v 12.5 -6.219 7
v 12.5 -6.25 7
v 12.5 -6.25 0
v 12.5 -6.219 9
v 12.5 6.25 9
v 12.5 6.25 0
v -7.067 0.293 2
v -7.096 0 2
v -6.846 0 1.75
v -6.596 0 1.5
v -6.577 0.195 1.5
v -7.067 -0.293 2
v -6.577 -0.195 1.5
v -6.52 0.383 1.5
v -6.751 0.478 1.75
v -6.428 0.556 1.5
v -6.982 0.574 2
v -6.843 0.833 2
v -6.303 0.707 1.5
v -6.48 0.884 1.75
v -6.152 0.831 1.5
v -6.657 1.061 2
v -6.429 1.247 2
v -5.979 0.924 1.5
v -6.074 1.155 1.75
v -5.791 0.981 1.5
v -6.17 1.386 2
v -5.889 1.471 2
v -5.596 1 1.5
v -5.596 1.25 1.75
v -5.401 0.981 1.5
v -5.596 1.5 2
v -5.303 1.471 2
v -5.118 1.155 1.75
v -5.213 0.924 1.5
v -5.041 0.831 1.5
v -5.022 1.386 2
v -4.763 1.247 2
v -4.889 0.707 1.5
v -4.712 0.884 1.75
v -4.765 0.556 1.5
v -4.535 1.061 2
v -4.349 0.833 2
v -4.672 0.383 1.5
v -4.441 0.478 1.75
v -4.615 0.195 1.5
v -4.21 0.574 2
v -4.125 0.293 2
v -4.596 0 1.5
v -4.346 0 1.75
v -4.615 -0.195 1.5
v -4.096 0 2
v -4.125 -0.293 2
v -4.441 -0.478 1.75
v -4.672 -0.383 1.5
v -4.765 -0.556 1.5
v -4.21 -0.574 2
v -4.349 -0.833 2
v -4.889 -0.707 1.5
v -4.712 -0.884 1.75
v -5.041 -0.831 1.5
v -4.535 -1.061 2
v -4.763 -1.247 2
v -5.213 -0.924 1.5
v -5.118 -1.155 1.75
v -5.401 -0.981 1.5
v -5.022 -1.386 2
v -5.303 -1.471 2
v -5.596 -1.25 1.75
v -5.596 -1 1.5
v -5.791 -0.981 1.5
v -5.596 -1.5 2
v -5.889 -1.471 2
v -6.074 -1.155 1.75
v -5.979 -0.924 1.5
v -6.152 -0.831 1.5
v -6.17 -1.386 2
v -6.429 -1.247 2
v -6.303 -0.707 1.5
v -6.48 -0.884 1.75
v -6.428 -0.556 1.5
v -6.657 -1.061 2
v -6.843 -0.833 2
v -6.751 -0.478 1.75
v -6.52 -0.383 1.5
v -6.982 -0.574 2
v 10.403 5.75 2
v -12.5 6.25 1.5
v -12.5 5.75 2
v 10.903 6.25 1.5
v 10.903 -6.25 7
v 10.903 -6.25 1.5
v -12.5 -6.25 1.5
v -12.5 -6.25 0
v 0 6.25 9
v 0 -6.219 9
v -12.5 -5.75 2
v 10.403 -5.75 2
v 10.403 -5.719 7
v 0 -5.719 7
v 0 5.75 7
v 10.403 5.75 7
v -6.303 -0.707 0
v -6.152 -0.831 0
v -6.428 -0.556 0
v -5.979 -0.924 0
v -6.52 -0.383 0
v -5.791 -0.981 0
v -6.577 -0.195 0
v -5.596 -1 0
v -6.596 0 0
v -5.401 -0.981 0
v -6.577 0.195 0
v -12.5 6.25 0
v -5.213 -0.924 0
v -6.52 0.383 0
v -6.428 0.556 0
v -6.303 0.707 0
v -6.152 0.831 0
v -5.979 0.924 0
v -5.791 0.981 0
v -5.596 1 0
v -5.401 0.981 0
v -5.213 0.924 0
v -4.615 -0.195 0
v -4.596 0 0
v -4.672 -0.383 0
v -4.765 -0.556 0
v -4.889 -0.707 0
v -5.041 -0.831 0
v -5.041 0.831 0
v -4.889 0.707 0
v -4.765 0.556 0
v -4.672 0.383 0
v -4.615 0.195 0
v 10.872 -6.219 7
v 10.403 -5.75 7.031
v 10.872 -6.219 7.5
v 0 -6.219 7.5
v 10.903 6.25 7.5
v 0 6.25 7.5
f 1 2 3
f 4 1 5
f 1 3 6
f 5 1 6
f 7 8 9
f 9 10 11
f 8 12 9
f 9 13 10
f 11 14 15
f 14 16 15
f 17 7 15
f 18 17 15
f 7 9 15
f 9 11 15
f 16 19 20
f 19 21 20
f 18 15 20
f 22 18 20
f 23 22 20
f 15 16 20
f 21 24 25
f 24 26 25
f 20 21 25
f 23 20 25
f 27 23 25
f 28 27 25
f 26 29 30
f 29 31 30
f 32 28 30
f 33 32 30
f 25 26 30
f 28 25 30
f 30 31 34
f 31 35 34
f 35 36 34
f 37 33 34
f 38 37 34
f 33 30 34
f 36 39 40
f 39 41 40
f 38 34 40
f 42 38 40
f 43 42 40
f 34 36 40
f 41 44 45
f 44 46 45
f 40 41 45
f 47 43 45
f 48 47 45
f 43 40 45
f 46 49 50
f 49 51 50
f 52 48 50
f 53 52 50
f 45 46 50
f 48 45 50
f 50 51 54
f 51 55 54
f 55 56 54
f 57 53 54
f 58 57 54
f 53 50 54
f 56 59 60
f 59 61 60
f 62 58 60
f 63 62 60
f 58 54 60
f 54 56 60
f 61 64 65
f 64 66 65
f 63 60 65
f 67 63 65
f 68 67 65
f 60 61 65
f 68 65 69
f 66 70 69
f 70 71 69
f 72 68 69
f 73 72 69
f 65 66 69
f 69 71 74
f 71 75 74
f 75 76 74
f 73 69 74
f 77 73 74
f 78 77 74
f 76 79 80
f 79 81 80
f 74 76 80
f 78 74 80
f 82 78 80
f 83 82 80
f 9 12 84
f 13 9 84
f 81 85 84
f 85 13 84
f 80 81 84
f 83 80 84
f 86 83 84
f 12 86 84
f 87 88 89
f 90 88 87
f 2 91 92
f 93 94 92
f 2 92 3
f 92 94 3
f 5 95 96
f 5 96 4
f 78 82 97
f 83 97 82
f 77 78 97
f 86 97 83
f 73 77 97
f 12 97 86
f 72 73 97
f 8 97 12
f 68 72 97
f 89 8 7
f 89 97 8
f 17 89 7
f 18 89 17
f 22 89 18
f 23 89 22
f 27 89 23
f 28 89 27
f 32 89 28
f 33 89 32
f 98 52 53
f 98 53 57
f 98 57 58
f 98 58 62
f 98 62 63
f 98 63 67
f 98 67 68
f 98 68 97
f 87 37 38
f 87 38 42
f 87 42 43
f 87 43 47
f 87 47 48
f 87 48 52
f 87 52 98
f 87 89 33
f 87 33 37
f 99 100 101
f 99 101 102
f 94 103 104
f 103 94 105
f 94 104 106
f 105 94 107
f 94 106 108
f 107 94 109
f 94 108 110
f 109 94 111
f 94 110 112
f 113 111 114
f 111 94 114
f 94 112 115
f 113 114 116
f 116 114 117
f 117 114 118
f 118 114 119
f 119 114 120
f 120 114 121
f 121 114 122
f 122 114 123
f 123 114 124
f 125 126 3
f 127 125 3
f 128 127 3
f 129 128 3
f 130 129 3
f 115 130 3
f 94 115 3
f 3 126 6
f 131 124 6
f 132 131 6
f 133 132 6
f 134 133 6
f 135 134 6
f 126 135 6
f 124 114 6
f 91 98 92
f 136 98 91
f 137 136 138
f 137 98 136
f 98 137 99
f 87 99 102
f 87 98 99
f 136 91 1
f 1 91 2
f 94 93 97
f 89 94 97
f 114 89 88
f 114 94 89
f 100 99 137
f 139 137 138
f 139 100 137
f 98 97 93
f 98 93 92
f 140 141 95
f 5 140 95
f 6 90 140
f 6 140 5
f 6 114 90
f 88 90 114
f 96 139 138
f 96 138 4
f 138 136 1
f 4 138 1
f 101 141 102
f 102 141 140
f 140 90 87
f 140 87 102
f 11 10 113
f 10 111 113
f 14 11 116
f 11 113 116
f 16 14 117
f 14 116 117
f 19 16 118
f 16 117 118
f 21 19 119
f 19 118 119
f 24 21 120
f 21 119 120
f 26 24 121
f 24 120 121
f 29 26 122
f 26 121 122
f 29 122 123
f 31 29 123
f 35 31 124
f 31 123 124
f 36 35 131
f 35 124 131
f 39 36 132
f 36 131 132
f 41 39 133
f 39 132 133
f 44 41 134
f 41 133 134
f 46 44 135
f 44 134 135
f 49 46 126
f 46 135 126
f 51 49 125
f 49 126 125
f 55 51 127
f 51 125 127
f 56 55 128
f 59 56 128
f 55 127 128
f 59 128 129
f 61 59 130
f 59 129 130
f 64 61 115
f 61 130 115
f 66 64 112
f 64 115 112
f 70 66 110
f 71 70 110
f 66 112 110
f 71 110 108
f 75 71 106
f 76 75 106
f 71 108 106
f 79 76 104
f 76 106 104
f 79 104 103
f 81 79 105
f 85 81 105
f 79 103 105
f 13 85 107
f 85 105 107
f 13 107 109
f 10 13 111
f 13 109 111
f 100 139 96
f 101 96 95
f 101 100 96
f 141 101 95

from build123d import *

# Parameters (mm, degrees)
F0_W           = 25
F0_H           = 12.5
F1_DEPTH       = 2
F2_W           = 2.0972218364
F2_H           = 12.5
F3_DEPTH       = 5
F4_W           = 12.5
F4_H           = 12.5694446266
F5_DEPTH       = 2
F6_SIZE        = 0.5
F8_D           = 2
F8_CSINK_D     = 3
F8_CSINK_ANGLE = 90
F9_DEPTH       = 0.1
F10_T4_DEPTH   = 13.4439057781
F10_T9_DEPTH   = 13.4439057781


# Not quite as in the source:
# - a fillet or chamfer that OpenCascade refuses, or shapes differently, is made with other operations: its cross-section is extruded or revolved along the edge and cut away or added


with BuildPart() as f1:
    # F0 (on Top) → F1 (new body)
    with BuildSketch(Plane.XY):
        Rectangle(F0_W, F0_H)
    extrude(amount=F1_DEPTH)

    # F2 (on face) → F3 (join)
    with BuildSketch(Plane.XY.offset(2)):
        with Locations((11.4513890818, 0)):
            Rectangle(F2_W, F2_H)
    extrude(amount=F3_DEPTH)

    # F4 (on face) → F5 (join)
    with BuildSketch(Plane.XY.offset(7)):
        with Locations((6.25, -0.0347223133)):
            Rectangle(F4_W, F4_H)
    extrude(amount=F5_DEPTH)

    # F6
    f6_edges = [f1.edges().sort_by_distance(p)[0] for p in [
        (10.402778, 6.25, 4.5),
        (-1.048611, 6.25, 2),
        (10.402778, -6.25, 4.5),
        (-1.048611, -6.25, 2),
        (5.201389, 6.25, 7),
    ]]
    chamfer(f6_edges, length=F6_SIZE)

    # F8 (through all)
    with Locations(Plane.XY.offset(2)):
        with Locations((-5.596134346, 0)):
            CounterSinkHole(F8_D / 2, F8_CSINK_D / 2, counter_sink_angle=F8_CSINK_ANGLE)

    # F9 (cut): a face of the model
    f9_faces = [f1.faces().sort_by_distance(p)[0] for p in [
        (6.25, -6.3194446266, 8),
    ]]
    extrude(f9_faces, amount=-F9_DEPTH, mode=Mode.SUBTRACT)

    # F10: chamfer of 0.5 on 1 edges, made by hand


with BuildPart() as f10_tool2:
    # F10_s3 → F10_t4 (new body)
    with BuildSketch(Plane.YZ.offset(-1.285841494)):
        Polygon((-5.7194446266, 7), (-6.2194446266, 7.5), (-6.2194446266, 7), align=None)
    extrude(amount=F10_T4_DEPTH)

    split(bisect_by=Plane(origin=(2.3263890818, 2.3263890818, 0), x_dir=(0, 0, 1), z_dir=(-0.7071067812, -0.7071067812, 0)), keep=Keep.TOP)


with BuildPart() as f1_1:
    add(f1.part)

    # F10_t1: cut F10_tool2
    add(f10_tool2.part, mode=Mode.SUBTRACT)


with BuildPart() as f10_tool7:
    # F10_s8 → F10_t9 (new body)
    with BuildSketch(Plane.YZ.offset(-1.285841494)):
        Polygon((-5.7194446266, 7), (-6.2194446266, 7.5), (-6.2194446266, 7), align=None)
    extrude(amount=F10_T9_DEPTH)

    split(bisect_by=Plane.YZ.offset(10.4027781636), keep=Keep.BOTTOM)


with BuildPart() as f1_2:
    add(f1_1.part)

    # F10_t6: cut F10_tool7
    add(f10_tool7.part, mode=Mode.SUBTRACT)


solid = f1_2.part
